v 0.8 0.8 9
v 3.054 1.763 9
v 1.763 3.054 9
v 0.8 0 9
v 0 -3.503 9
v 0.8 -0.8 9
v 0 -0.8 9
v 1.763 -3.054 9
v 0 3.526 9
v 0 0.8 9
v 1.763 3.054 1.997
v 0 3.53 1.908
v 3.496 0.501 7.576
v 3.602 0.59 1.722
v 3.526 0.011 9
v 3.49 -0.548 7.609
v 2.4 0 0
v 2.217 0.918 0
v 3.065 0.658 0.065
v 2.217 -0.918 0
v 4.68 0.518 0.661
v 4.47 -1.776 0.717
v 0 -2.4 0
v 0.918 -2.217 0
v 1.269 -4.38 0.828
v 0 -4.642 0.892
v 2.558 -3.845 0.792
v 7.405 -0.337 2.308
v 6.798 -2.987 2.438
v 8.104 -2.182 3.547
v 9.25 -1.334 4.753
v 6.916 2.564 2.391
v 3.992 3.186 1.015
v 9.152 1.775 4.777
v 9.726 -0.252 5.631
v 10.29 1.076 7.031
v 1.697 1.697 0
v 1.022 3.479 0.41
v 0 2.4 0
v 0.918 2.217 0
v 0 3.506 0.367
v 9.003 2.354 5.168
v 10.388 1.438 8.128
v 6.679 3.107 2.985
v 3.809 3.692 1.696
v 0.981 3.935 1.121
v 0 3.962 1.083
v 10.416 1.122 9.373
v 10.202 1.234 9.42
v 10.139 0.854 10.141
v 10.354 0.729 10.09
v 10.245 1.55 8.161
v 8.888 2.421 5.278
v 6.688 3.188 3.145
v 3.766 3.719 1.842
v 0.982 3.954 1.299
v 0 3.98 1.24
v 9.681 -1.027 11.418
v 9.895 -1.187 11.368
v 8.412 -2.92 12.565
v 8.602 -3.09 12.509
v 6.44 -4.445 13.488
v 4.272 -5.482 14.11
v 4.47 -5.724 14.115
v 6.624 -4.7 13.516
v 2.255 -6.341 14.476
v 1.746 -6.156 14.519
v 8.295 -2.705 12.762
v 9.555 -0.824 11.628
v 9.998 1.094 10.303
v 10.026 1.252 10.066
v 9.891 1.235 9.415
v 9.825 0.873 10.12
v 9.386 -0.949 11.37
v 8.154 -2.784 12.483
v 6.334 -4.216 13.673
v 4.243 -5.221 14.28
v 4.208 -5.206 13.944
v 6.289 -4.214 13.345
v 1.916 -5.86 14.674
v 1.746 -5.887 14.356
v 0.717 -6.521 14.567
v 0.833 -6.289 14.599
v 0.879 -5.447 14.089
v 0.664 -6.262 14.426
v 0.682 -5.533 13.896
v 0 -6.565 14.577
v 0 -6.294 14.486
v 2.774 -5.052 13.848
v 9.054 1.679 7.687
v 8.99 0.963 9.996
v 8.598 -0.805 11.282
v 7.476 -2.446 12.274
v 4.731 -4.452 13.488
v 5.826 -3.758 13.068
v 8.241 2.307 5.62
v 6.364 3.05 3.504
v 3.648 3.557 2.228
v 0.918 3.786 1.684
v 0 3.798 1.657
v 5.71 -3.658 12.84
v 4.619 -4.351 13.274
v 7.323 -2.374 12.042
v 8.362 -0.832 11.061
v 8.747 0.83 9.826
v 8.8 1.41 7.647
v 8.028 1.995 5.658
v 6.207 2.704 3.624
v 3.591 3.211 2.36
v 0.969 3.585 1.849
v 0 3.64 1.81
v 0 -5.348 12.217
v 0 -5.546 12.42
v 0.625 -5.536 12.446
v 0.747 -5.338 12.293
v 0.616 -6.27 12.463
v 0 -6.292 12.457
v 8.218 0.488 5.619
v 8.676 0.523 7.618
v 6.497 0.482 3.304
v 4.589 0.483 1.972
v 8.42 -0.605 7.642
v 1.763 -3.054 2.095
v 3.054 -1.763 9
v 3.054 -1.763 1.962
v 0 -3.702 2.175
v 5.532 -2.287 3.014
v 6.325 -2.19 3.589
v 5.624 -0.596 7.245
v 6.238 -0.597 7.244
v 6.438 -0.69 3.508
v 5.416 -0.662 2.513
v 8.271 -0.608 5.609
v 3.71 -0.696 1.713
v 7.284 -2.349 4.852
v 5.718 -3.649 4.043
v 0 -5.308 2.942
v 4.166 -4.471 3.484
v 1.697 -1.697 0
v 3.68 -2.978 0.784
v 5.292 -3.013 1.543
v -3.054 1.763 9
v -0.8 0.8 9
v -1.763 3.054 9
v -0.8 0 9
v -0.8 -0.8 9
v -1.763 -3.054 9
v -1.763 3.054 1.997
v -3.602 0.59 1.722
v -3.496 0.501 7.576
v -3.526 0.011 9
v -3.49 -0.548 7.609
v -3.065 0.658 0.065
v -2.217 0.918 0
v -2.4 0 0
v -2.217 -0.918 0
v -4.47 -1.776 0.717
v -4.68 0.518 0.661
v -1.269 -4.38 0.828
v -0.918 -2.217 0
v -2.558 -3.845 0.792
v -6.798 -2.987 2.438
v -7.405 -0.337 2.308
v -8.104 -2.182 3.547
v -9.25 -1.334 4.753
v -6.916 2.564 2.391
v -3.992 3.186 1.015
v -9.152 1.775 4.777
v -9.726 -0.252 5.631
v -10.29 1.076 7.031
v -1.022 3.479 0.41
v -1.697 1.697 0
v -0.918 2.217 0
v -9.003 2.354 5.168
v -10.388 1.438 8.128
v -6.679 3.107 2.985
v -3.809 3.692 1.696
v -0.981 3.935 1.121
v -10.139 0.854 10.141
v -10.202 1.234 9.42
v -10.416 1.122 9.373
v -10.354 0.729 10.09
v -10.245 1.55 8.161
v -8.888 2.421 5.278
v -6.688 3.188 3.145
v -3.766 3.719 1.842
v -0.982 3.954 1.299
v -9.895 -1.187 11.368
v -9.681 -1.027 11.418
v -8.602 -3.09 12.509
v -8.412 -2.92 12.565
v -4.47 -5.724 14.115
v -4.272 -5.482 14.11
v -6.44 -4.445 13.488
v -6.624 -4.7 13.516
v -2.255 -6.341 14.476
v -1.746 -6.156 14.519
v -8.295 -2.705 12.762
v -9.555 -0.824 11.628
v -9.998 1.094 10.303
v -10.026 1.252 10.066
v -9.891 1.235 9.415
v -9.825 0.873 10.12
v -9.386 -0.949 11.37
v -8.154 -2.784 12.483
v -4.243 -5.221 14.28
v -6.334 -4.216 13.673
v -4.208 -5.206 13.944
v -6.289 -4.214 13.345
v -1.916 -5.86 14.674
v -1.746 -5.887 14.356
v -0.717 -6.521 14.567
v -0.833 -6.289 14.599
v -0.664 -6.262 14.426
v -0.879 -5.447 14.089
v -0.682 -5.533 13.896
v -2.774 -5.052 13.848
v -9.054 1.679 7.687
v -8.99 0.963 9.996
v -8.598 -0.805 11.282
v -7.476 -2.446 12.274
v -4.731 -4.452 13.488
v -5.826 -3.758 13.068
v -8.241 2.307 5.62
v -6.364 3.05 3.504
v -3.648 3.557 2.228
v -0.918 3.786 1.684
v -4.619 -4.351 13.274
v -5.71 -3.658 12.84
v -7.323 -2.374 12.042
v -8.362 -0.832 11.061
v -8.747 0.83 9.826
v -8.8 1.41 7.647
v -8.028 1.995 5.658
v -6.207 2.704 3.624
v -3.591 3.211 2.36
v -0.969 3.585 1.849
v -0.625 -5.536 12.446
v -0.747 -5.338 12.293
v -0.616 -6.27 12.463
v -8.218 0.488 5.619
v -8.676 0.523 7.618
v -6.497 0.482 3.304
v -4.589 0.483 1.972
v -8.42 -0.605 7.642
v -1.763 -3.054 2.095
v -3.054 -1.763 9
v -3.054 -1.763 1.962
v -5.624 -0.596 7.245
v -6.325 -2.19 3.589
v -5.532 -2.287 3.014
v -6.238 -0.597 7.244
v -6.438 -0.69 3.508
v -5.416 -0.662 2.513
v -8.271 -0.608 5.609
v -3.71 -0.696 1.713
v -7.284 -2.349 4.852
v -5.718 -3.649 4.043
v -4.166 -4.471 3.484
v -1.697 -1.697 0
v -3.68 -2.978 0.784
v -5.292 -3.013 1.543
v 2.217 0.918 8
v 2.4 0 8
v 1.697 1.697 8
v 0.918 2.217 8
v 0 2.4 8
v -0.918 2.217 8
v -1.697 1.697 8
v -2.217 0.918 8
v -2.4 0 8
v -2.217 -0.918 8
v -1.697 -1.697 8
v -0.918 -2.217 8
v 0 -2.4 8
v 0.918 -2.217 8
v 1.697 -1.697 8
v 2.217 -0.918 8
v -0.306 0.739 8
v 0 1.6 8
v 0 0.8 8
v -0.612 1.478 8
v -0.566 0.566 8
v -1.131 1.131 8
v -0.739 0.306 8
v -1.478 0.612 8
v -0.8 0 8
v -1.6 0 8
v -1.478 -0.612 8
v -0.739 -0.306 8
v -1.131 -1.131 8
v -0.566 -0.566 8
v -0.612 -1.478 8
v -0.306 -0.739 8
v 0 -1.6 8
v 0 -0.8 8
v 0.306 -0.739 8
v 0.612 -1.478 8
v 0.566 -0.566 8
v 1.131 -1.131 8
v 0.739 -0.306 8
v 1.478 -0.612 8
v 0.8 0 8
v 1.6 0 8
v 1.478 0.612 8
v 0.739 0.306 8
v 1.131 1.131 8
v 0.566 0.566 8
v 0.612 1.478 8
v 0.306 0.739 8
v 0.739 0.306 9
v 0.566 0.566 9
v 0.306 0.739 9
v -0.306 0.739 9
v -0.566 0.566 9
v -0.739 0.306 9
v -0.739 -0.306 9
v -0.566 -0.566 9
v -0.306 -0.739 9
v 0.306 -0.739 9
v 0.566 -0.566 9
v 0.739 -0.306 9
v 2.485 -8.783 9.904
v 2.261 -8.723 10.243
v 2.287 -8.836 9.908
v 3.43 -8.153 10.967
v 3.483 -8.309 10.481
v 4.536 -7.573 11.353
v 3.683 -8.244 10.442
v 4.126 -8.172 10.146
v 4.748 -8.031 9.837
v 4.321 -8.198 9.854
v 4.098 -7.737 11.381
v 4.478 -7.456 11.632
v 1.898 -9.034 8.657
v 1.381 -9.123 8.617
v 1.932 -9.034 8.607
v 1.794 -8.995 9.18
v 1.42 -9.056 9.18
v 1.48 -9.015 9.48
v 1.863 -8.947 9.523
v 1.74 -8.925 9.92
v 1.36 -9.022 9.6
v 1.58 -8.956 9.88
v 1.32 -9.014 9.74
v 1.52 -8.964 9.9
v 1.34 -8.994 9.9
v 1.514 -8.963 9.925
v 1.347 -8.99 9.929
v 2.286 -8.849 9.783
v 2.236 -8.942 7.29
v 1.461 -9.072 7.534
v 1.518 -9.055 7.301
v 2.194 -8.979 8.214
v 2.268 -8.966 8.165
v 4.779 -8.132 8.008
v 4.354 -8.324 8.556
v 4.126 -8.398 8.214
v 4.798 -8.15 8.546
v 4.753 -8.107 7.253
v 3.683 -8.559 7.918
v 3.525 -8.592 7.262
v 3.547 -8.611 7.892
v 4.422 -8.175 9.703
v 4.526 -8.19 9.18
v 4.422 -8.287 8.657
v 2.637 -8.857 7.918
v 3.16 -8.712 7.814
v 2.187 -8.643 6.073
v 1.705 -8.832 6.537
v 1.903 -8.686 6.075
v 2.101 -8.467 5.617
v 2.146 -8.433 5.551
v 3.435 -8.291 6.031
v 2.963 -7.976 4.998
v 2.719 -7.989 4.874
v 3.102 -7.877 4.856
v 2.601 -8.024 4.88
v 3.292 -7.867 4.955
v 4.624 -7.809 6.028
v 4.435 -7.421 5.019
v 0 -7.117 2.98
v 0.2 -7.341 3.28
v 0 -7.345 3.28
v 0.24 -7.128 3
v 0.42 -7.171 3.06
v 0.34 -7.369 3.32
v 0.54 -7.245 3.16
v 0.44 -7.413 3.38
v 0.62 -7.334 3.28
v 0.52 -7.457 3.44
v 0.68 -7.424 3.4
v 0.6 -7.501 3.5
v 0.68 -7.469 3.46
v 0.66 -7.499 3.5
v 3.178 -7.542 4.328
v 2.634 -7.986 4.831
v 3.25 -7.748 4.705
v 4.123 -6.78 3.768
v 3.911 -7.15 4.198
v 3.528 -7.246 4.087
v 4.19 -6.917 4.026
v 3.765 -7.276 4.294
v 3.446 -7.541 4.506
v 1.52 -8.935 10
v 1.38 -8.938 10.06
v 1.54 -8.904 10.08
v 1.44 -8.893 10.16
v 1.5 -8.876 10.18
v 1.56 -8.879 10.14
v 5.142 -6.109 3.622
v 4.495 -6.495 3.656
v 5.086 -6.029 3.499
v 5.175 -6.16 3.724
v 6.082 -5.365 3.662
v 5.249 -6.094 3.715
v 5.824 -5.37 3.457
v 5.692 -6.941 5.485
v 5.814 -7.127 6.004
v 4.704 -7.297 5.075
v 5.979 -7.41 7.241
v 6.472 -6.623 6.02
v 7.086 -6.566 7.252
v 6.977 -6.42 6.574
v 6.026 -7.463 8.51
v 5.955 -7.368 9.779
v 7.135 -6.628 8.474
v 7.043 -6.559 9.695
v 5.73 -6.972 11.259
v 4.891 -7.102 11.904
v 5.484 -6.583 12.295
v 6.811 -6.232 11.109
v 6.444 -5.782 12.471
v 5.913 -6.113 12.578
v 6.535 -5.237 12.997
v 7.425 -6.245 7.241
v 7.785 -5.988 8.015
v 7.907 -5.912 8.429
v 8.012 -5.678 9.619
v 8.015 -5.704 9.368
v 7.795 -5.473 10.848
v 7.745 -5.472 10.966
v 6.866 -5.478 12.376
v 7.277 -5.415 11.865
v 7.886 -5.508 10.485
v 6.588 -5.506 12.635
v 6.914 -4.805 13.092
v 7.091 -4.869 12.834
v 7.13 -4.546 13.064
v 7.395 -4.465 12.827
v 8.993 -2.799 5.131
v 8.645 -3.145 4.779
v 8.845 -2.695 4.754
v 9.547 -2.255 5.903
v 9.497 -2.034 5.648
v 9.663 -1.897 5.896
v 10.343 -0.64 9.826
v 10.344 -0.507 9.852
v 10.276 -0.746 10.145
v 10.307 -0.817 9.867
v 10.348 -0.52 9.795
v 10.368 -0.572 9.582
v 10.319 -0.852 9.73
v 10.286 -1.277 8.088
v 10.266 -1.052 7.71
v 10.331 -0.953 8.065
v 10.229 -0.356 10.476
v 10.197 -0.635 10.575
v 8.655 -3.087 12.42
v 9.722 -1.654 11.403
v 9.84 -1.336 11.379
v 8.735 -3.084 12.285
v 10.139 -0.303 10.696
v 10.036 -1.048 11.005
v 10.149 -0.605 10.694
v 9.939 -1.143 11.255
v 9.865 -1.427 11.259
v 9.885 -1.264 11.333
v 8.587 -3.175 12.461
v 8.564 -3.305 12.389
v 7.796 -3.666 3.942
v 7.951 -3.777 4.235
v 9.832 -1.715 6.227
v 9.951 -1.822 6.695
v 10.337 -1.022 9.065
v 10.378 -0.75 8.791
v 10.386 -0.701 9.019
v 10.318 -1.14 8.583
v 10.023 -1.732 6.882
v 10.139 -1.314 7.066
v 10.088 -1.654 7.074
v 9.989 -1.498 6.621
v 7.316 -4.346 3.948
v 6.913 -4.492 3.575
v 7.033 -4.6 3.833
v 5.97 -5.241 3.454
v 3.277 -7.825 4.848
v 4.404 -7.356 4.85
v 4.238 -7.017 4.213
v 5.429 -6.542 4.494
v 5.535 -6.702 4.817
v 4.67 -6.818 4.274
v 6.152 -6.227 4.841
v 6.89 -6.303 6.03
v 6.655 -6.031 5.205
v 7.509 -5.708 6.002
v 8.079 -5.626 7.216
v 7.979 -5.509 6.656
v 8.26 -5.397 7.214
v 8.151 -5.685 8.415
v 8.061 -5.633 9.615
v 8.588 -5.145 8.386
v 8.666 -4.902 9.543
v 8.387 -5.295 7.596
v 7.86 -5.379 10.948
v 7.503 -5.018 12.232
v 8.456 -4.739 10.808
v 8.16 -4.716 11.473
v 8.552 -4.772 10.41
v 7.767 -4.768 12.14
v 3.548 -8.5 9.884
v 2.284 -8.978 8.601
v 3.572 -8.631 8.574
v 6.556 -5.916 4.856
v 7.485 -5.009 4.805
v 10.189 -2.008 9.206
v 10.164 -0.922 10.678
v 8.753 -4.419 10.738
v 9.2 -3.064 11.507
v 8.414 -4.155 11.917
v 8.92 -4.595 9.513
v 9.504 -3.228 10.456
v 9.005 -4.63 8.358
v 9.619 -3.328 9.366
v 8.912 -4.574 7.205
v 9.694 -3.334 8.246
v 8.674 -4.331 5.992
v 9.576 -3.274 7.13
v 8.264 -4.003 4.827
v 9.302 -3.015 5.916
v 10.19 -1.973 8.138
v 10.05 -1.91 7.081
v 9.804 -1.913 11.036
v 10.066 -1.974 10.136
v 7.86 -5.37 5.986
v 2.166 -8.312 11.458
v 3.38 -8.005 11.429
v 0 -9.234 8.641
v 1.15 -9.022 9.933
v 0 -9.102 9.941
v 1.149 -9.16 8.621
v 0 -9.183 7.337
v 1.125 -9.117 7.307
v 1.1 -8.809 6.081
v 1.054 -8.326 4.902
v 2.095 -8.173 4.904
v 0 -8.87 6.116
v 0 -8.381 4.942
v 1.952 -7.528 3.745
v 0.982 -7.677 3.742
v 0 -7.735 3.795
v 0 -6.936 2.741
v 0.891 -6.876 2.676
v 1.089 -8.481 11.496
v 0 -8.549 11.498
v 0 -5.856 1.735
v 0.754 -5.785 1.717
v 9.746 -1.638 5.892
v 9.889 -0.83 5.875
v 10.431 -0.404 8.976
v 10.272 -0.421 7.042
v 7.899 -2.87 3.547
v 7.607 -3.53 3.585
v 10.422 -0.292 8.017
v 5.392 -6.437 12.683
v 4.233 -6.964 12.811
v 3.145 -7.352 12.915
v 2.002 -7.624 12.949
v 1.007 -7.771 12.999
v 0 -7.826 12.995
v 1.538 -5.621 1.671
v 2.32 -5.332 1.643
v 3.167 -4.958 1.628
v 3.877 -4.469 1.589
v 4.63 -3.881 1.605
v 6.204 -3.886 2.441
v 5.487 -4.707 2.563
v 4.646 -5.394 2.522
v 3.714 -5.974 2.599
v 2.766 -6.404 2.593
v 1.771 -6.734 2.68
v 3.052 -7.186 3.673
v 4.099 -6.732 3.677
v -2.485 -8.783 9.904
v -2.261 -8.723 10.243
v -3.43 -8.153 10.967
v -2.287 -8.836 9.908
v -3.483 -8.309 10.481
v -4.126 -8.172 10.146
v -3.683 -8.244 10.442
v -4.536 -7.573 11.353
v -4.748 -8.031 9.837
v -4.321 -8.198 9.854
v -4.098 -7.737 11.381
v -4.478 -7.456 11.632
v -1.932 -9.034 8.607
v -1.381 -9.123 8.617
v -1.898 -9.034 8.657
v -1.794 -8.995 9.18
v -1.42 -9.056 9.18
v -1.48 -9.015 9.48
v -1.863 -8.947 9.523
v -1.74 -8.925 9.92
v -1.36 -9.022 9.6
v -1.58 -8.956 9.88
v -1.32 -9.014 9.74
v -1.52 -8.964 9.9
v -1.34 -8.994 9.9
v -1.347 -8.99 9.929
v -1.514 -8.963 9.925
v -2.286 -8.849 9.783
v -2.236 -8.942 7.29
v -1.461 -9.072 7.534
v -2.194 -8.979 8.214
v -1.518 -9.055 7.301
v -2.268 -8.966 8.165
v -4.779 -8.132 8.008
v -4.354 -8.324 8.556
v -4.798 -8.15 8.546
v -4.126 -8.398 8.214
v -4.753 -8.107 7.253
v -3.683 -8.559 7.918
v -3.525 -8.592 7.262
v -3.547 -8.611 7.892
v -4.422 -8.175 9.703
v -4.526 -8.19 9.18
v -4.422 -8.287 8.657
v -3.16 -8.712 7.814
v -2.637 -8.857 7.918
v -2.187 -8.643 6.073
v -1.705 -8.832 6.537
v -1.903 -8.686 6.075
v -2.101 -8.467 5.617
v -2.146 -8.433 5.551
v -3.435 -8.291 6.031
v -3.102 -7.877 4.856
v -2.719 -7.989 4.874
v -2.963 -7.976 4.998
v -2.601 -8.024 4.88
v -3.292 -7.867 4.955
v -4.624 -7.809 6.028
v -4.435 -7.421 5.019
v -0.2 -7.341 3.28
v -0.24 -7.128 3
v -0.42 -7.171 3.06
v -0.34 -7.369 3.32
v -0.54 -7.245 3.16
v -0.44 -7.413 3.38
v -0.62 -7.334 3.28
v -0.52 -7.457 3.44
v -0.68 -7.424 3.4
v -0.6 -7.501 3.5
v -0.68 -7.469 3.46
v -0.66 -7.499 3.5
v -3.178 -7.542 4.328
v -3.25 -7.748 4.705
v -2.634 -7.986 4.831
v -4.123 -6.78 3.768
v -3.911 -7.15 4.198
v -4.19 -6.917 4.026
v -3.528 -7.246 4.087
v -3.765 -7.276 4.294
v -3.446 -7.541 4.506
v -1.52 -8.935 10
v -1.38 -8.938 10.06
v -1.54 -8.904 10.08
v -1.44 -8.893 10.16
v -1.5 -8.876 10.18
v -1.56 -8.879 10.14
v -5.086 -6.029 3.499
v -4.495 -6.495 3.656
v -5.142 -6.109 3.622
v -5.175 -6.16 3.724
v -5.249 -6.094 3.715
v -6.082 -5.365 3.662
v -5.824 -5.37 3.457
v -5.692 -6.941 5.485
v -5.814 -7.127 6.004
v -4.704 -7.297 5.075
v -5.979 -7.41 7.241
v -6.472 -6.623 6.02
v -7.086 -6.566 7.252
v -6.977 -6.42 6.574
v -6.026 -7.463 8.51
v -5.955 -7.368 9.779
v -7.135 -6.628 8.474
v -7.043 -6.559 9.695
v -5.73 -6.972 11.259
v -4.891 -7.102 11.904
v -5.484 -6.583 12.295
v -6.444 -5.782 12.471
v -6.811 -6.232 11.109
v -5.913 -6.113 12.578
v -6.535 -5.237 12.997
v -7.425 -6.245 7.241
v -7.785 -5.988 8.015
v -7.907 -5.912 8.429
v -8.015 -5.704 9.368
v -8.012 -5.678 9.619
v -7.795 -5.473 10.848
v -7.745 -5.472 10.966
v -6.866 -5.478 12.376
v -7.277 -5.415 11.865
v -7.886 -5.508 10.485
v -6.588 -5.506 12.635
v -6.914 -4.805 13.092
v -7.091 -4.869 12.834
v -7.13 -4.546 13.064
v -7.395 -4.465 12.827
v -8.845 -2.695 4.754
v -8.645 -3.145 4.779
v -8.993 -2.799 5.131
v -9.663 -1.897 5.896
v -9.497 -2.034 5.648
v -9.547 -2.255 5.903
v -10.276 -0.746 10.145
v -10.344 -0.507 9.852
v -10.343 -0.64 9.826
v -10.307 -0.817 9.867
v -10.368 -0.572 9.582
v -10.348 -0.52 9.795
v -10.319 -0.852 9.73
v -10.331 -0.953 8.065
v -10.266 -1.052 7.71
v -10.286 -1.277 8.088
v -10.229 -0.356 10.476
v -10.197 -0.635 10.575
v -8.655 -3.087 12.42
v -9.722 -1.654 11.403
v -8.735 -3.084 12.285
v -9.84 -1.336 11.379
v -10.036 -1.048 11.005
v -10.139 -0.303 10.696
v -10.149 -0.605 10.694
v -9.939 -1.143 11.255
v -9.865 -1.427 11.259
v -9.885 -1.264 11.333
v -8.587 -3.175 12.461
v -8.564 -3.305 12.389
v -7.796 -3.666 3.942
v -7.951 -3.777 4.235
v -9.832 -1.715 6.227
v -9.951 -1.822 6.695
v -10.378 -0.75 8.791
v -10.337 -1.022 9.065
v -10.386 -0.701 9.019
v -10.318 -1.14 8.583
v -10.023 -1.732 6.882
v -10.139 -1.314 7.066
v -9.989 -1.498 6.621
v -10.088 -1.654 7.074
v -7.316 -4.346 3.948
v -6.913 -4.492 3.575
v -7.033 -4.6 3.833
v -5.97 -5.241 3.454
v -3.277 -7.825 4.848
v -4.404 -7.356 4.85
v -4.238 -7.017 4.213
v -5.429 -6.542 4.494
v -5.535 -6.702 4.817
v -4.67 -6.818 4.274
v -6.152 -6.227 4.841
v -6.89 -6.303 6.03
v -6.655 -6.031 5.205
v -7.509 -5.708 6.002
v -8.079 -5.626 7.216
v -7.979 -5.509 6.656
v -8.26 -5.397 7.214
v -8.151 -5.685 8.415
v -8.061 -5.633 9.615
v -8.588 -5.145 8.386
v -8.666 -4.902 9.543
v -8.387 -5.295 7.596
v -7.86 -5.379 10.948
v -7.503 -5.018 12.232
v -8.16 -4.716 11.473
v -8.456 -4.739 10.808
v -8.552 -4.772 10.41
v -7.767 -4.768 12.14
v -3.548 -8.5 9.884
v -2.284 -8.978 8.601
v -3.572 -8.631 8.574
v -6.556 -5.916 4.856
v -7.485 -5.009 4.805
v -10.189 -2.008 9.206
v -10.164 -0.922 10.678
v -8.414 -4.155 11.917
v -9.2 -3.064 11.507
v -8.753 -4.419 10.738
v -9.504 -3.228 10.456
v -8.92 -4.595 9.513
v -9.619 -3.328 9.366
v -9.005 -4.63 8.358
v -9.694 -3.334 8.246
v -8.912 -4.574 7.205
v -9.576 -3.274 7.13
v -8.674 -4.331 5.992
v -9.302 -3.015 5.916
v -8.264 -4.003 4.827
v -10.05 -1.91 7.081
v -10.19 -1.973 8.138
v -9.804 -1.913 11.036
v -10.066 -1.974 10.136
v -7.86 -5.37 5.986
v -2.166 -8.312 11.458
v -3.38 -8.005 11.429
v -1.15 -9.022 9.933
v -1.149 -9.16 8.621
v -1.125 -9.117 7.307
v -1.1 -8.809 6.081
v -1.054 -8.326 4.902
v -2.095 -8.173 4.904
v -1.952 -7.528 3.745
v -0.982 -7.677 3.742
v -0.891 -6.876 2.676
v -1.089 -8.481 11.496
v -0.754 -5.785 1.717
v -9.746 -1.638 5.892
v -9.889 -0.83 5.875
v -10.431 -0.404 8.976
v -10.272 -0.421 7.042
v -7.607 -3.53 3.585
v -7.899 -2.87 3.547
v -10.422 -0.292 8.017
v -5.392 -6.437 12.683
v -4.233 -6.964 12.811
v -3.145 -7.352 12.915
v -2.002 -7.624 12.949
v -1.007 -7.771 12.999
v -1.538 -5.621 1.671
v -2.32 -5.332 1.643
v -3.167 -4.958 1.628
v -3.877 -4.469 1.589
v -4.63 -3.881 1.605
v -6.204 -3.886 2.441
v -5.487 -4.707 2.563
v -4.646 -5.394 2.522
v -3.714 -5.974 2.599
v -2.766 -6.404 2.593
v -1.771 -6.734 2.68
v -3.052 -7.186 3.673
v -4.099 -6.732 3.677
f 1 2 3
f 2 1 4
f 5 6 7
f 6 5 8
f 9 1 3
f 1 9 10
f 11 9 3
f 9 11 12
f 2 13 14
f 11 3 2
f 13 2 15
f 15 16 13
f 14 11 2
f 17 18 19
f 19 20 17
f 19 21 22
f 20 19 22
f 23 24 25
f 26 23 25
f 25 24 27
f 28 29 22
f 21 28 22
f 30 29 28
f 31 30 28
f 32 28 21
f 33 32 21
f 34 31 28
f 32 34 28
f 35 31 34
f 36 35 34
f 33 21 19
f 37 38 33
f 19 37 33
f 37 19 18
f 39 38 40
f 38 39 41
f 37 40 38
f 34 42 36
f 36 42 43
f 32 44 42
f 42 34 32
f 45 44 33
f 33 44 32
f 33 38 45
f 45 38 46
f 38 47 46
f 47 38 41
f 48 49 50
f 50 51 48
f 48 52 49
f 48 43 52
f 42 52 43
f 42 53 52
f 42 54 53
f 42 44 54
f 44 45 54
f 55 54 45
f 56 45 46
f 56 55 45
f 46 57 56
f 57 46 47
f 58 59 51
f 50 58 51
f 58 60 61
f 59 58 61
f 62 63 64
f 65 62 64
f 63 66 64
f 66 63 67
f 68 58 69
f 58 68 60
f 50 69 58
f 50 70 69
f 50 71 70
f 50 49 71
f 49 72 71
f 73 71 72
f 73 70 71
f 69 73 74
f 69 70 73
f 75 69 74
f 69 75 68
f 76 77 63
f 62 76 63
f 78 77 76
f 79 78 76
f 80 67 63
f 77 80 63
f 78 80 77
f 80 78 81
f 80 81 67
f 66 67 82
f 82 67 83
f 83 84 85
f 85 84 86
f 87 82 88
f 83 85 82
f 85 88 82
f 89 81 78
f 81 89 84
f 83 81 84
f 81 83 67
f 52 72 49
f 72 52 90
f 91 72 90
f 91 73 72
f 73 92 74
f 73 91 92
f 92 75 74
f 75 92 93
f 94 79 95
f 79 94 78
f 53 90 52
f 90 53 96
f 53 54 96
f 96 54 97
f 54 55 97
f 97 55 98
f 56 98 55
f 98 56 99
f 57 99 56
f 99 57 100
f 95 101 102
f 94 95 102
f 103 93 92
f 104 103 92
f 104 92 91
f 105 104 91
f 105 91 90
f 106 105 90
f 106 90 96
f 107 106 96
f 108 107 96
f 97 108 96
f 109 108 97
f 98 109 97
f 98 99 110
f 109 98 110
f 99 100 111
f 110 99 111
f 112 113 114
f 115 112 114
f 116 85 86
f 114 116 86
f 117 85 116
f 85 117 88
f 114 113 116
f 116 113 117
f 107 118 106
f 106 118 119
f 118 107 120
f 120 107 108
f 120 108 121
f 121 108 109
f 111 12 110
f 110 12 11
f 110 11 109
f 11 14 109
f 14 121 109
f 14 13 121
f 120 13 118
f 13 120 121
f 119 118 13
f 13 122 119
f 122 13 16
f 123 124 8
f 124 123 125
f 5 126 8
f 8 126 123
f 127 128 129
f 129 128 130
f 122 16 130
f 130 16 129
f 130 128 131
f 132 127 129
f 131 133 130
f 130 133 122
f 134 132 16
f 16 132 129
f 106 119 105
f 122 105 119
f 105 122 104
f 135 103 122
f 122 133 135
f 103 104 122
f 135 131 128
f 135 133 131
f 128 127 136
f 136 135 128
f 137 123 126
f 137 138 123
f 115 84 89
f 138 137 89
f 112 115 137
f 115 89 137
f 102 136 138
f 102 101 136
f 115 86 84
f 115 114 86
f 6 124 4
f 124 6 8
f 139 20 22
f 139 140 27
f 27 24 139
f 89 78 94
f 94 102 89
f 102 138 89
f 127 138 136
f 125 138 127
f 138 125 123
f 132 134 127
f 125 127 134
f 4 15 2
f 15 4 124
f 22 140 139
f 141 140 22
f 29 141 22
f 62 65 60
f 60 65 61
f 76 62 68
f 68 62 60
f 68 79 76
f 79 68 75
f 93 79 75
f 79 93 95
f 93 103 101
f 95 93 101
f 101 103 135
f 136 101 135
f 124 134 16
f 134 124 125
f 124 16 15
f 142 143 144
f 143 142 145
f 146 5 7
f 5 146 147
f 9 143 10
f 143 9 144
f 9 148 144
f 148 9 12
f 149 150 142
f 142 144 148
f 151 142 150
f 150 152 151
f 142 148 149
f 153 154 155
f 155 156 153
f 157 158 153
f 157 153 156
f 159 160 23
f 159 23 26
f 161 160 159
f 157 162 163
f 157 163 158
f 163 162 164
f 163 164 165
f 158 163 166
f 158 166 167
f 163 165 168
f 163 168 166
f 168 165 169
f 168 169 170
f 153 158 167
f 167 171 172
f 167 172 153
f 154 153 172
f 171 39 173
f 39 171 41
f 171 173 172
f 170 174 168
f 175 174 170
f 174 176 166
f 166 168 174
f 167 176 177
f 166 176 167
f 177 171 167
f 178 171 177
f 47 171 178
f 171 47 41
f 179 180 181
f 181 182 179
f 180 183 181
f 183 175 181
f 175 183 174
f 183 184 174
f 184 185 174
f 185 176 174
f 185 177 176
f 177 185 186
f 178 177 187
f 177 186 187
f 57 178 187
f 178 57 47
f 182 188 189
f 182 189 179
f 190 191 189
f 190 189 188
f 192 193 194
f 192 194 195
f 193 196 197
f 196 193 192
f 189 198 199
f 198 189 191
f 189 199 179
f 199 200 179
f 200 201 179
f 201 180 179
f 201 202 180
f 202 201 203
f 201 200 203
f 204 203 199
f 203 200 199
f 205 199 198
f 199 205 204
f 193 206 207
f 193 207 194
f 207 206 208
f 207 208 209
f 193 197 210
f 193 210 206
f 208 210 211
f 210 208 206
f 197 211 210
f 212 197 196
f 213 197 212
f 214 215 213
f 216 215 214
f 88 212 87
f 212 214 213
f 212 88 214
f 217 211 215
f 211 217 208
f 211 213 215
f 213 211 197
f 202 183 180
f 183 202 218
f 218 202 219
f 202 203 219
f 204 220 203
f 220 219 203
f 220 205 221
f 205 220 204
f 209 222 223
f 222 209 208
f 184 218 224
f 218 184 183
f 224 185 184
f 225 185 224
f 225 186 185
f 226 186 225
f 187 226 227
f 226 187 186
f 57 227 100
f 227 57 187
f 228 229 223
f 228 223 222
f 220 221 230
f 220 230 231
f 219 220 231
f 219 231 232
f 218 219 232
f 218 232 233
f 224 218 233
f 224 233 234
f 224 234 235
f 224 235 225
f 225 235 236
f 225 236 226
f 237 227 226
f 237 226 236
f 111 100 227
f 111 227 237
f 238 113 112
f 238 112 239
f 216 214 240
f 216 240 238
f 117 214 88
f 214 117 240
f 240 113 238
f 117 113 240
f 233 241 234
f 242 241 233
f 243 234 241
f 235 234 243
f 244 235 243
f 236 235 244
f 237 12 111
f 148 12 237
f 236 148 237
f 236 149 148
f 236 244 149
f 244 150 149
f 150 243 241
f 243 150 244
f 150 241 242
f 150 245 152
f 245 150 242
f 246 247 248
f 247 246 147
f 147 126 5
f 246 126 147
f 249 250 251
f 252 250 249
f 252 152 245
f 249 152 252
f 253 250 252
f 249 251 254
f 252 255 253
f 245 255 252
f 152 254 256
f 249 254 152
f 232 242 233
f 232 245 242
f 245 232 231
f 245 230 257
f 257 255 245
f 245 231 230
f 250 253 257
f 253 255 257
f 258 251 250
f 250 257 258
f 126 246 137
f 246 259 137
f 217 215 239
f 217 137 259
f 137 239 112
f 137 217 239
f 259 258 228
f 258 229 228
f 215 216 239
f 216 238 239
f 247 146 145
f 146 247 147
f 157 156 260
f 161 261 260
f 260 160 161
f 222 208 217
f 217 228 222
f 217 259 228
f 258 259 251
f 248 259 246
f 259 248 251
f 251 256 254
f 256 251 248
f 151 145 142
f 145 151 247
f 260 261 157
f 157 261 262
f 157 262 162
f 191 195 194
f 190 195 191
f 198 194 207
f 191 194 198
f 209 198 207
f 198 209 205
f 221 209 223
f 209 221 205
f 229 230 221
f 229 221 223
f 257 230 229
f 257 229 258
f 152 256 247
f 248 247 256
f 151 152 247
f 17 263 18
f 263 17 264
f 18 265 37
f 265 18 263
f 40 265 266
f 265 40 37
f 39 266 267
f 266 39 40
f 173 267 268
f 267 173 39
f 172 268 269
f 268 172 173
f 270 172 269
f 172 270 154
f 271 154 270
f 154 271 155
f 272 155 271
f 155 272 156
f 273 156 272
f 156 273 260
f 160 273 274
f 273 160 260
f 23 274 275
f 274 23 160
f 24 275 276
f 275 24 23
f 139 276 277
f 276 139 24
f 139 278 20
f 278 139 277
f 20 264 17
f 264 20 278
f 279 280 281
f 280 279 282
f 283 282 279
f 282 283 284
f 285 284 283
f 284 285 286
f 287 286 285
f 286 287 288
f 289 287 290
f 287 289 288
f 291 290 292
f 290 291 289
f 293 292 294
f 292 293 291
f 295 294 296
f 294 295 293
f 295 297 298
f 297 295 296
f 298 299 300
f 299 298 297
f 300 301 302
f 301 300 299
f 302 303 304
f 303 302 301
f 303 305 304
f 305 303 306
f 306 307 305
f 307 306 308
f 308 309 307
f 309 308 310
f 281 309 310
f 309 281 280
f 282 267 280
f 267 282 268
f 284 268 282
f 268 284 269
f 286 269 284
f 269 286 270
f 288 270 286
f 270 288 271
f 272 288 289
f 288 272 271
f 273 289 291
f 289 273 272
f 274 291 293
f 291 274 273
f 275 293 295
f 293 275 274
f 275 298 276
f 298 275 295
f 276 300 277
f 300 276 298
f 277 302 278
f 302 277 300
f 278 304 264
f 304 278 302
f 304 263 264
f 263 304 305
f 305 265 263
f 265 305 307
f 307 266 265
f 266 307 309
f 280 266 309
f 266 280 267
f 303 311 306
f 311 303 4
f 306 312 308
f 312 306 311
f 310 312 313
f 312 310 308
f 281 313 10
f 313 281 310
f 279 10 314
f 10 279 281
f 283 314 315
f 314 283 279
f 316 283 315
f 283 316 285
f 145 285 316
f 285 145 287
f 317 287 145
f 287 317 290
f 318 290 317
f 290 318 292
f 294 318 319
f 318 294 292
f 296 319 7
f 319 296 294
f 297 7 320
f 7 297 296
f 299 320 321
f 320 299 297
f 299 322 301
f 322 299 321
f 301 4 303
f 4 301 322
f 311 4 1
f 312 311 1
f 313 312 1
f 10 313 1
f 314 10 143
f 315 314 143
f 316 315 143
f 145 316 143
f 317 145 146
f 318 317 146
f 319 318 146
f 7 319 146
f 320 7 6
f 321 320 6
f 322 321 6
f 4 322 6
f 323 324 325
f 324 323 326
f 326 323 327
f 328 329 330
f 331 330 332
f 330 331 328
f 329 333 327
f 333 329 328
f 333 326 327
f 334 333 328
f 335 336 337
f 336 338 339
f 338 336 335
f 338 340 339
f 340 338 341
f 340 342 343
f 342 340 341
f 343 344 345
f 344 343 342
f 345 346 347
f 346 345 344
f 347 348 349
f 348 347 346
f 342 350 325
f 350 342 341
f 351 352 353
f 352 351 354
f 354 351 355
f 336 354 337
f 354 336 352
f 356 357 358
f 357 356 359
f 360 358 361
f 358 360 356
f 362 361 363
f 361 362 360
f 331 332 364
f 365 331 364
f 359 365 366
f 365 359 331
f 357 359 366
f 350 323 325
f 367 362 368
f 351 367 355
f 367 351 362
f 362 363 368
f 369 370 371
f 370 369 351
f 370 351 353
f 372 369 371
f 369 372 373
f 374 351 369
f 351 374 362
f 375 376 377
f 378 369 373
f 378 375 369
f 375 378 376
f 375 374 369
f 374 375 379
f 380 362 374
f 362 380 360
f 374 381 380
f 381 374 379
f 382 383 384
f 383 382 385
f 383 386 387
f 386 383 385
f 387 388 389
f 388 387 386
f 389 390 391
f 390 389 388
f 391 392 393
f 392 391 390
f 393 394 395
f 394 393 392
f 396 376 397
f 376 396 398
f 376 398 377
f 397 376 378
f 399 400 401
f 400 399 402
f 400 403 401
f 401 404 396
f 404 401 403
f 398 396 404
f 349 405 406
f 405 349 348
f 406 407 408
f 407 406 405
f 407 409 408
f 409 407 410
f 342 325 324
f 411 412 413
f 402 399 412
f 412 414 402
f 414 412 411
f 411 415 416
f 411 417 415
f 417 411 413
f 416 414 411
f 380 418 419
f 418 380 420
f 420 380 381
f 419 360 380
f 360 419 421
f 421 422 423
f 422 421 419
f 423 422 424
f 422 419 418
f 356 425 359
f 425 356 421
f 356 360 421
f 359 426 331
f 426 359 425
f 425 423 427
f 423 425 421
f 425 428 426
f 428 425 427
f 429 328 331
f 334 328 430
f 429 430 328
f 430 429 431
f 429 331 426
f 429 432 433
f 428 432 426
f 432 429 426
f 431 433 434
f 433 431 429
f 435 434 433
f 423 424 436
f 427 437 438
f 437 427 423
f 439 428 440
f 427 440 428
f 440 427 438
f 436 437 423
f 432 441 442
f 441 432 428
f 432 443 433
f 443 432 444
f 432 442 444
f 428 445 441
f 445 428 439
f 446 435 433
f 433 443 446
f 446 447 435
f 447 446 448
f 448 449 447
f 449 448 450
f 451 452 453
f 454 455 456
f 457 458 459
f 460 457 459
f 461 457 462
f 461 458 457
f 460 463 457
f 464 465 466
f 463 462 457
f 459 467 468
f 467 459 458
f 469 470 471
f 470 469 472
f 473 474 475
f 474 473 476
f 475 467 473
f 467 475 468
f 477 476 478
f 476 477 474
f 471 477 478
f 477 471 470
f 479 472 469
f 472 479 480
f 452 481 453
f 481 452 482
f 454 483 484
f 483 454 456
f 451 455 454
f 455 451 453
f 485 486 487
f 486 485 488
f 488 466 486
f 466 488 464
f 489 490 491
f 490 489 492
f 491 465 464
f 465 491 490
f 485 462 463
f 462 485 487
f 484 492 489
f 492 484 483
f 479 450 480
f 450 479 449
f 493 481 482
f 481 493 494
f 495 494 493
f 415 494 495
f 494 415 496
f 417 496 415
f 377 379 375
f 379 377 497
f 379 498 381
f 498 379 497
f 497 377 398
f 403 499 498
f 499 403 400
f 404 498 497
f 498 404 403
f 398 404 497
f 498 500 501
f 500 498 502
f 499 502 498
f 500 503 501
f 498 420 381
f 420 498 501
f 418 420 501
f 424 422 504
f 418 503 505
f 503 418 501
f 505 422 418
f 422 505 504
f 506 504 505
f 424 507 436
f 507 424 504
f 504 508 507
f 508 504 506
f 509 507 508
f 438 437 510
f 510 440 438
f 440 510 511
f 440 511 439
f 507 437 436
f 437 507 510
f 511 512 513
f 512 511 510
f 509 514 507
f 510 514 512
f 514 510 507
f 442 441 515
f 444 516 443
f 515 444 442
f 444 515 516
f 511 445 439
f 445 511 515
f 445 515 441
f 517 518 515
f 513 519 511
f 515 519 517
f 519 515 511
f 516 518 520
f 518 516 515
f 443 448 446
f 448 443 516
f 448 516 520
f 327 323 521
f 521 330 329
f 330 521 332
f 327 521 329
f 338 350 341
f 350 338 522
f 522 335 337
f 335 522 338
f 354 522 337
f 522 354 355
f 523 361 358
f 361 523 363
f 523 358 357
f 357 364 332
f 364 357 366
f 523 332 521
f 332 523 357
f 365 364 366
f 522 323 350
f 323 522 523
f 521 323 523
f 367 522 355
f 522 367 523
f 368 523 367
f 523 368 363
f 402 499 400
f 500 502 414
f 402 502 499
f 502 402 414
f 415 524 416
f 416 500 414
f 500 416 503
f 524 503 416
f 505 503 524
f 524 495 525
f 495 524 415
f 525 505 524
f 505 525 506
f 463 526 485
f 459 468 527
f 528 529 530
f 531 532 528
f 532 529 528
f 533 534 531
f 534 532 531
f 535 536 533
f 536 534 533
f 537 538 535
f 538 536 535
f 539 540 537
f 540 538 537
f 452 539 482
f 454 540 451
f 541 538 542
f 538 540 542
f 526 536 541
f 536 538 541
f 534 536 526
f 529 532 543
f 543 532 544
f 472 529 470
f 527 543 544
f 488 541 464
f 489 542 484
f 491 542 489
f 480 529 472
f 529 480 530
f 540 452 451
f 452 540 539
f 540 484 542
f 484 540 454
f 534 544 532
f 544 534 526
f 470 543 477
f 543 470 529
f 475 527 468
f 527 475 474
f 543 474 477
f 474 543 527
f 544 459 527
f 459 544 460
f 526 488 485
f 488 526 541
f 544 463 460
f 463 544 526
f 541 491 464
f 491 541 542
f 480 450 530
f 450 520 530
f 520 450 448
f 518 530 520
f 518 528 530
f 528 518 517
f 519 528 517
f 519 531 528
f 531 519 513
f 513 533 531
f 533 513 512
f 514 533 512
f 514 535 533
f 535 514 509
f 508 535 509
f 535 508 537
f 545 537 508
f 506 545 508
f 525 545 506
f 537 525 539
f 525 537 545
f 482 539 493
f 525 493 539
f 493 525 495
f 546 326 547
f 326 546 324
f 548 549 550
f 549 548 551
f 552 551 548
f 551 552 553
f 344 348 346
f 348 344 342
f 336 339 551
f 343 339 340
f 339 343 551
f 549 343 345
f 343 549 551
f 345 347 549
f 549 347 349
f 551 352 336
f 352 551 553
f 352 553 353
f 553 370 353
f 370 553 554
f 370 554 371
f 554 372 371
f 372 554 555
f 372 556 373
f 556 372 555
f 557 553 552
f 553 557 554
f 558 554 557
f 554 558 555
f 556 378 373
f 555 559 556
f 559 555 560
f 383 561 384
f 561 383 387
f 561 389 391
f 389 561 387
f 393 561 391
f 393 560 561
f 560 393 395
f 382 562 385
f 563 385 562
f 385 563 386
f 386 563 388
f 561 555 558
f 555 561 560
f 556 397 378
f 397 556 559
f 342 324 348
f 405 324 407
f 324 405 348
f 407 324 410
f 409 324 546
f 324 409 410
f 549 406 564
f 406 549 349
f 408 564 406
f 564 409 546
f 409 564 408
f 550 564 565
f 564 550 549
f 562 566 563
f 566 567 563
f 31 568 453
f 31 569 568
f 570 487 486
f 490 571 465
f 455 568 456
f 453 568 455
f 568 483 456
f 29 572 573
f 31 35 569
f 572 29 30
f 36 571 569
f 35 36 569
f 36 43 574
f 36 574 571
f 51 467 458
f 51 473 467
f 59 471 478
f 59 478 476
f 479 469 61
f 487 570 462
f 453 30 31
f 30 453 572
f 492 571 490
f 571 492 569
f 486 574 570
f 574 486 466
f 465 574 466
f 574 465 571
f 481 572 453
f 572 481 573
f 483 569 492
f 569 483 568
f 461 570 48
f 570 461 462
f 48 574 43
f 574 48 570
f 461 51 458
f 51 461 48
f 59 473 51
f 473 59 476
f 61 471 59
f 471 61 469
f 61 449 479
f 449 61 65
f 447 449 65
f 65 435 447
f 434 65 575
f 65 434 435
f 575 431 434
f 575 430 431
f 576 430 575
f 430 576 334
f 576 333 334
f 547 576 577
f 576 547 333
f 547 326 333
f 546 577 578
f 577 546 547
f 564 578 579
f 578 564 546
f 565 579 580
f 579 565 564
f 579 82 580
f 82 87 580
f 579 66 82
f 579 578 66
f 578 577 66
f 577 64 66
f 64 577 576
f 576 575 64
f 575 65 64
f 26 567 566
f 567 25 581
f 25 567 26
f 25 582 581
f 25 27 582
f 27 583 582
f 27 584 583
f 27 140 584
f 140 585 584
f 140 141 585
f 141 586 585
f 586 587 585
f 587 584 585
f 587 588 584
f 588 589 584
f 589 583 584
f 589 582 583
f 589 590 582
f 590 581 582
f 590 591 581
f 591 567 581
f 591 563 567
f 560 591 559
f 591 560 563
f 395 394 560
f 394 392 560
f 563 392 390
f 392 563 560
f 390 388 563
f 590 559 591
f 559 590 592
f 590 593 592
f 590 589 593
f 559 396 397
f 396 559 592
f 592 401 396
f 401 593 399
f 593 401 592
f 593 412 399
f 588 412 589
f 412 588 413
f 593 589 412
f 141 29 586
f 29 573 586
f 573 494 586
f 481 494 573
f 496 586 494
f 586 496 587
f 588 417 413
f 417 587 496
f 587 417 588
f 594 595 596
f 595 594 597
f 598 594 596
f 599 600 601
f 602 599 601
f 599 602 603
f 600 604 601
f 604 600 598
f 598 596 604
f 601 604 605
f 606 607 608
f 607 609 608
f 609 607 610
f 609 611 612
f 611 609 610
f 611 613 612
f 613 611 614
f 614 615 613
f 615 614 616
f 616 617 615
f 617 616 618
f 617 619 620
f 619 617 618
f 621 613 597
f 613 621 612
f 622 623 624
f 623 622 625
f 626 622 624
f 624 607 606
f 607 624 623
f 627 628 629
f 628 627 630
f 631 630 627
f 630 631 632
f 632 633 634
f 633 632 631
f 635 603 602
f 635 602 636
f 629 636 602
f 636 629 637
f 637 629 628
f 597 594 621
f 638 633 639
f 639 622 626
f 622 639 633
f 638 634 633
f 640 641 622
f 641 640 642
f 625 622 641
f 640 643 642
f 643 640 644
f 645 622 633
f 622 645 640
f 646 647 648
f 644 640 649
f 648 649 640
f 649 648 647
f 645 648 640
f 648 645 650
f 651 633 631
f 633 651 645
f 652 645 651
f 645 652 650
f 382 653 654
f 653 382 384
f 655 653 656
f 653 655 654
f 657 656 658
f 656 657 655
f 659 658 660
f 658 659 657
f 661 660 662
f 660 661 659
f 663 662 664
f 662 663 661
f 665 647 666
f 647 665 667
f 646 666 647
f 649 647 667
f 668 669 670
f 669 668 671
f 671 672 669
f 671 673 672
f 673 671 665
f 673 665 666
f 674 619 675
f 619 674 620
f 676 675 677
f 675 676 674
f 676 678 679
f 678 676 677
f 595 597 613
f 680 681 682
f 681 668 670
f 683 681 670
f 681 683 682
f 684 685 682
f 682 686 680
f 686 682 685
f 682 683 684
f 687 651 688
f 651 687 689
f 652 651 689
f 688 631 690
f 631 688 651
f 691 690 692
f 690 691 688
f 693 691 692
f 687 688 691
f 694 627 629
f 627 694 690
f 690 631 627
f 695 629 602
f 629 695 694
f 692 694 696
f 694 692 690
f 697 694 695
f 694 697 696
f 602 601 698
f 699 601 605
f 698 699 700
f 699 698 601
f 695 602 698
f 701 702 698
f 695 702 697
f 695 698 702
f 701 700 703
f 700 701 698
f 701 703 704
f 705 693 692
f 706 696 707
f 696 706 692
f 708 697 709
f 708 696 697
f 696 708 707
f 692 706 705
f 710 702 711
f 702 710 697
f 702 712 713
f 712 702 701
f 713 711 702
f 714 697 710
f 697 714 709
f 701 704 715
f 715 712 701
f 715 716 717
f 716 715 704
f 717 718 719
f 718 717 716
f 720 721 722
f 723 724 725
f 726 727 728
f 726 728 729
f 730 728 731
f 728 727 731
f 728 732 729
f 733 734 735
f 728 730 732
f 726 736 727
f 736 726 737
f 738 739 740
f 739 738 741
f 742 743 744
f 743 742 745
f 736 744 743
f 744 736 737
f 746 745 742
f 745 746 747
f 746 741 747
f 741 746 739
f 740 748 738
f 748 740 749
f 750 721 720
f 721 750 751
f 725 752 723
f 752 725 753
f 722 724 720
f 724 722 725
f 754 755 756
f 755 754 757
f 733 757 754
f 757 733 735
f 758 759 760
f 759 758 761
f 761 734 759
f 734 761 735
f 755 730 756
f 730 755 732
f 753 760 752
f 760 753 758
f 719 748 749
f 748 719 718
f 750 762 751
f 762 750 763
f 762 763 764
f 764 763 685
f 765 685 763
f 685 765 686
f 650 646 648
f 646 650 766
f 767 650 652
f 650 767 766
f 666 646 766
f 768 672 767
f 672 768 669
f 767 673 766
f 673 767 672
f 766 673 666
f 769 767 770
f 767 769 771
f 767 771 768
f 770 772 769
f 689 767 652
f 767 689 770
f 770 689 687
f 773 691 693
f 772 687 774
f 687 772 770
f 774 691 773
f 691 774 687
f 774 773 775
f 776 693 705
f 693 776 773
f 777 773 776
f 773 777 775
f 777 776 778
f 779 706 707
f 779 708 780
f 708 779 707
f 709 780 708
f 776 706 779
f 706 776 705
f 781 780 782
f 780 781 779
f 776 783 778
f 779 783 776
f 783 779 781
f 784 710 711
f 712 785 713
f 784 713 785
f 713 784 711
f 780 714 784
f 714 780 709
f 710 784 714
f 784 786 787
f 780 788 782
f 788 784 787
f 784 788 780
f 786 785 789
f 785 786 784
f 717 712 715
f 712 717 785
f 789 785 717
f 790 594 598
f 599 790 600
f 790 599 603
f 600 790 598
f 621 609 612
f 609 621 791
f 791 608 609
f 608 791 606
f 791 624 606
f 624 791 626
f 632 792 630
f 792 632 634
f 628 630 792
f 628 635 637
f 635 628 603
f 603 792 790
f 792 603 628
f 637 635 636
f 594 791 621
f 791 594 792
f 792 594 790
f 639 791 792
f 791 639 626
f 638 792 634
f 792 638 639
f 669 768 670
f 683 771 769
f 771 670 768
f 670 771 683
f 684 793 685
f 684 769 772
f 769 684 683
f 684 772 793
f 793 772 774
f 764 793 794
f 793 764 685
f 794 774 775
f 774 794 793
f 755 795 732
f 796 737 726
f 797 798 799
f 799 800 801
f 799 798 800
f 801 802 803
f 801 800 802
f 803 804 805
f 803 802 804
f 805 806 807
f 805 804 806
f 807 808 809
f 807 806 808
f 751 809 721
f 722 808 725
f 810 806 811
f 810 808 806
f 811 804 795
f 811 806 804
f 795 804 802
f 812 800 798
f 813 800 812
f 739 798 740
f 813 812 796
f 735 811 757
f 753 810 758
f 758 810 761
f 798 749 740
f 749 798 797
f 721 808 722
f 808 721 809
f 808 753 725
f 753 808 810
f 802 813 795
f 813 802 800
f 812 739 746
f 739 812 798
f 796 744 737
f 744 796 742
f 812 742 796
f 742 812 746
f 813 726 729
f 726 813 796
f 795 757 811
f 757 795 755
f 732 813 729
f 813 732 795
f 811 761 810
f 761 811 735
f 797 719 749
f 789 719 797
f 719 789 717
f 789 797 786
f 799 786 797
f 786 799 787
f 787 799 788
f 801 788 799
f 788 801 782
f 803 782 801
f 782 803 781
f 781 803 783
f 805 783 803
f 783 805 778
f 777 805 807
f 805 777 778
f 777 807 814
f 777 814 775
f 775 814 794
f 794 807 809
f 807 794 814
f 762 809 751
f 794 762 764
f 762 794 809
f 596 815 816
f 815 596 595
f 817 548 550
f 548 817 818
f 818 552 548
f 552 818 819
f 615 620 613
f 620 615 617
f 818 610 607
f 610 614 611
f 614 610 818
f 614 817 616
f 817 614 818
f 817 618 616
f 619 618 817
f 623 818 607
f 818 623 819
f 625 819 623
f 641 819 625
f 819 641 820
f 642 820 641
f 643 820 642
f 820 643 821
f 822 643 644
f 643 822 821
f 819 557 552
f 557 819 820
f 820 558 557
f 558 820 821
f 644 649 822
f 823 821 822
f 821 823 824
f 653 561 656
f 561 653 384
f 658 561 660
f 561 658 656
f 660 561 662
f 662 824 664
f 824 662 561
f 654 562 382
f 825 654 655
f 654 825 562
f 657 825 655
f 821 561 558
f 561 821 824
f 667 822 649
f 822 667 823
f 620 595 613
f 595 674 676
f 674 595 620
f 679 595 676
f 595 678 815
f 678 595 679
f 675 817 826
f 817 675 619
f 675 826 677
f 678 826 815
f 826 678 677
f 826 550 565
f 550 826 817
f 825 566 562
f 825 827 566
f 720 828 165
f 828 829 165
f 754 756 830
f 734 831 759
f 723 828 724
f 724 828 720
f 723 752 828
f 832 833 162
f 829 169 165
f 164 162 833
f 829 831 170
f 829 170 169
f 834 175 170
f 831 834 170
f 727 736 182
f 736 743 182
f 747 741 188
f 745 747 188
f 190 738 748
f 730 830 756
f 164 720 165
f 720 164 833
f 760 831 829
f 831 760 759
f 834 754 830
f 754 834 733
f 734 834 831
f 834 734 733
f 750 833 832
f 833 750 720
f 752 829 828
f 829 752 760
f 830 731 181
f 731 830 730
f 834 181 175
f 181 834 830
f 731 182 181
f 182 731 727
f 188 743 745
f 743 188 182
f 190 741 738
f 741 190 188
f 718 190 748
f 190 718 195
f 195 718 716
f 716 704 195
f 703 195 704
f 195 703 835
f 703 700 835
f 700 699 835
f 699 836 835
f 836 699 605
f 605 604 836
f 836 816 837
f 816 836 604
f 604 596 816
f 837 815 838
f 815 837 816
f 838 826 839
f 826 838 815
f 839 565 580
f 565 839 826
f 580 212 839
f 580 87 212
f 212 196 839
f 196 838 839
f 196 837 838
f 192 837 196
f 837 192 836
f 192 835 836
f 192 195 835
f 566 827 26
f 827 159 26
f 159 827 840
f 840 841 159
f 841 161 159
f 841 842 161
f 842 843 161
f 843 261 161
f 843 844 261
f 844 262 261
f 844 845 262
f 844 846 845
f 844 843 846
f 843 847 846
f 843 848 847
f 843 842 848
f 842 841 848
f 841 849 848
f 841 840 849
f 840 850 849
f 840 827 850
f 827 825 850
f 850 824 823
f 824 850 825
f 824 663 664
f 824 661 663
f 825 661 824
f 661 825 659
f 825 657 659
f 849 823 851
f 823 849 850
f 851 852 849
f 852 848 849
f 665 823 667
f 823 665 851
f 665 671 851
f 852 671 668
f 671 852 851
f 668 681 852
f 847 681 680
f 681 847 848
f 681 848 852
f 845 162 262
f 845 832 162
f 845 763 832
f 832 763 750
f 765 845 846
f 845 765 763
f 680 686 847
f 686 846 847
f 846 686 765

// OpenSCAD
use <../lib.scad>
use <s/31512p03s01.scad>
use <s/31512s01.scad>
use <s/31512s04.scad>
function ldraw_lib__31512p03() = [
// 0 ~Minifig Head Powerpuff Girls Face with Buttercup Pattern
// 0 Name: 31512p03.dat
// 0 Author: Magnus Forsberg [MagFors]
// 0 !LDRAW_ORG Part UPDATE 2023-05
// 0 !LICENSE Licensed under CC BY 4.0 : see CAreadme.txt
// 
// 0 BFC CERTIFY CCW
  [0,"BFC","CERTIFY"],
  [0,"BFC","CCW"],
// 
// 0 !KEYWORDS set 41288
// 
// 0 !HISTORY 2023-10-31 [OrionP] Official Update 2023-05
// 
// 
// 1 16 0 0 0 1 0 0 0 1 0 0 0 1 s\31512s01.dat
  [1,16,0,0,0,1,0,0,0,1,0,0,0,1, ldraw_lib__s__31512s01()],
// 1 16 0 0 0 1 0 0 0 1 0 0 0 1 s\31512p03s01.dat
  [1,16,0,0,0,1,0,0,0,1,0,0,0,1, ldraw_lib__s__31512p03s01()],
// 1 16 0 0 0 -1 0 0 0 1 0 0 0 1 s\31512p03s01.dat
  [1,16,0,0,0,-1,0,0,0,1,0,0,0,1, ldraw_lib__s__31512p03s01()],
// 1 16 0 0 0 1 0 0 0 1 0 0 0 1 s\31512s04.dat
  [1,16,0,0,0,1,0,0,0,1,0,0,0,1, ldraw_lib__s__31512s04()],
// 1 16 0 0 0 -1 0 0 0 1 0 0 0 1 s\31512s04.dat
  [1,16,0,0,0,-1,0,0,0,1,0,0,0,1, ldraw_lib__s__31512s04()],
];
module ldraw_lib__31512p03(step=0, col=false, unit=2/5, alt=false, line=0.2, solid=!$preview)
    makepoly(ldraw_lib__31512p03(), step=step, col=col, unit=unit, alt=alt, line=line, solid=solid);
ldraw_lib__31512p03(line=0.2);
